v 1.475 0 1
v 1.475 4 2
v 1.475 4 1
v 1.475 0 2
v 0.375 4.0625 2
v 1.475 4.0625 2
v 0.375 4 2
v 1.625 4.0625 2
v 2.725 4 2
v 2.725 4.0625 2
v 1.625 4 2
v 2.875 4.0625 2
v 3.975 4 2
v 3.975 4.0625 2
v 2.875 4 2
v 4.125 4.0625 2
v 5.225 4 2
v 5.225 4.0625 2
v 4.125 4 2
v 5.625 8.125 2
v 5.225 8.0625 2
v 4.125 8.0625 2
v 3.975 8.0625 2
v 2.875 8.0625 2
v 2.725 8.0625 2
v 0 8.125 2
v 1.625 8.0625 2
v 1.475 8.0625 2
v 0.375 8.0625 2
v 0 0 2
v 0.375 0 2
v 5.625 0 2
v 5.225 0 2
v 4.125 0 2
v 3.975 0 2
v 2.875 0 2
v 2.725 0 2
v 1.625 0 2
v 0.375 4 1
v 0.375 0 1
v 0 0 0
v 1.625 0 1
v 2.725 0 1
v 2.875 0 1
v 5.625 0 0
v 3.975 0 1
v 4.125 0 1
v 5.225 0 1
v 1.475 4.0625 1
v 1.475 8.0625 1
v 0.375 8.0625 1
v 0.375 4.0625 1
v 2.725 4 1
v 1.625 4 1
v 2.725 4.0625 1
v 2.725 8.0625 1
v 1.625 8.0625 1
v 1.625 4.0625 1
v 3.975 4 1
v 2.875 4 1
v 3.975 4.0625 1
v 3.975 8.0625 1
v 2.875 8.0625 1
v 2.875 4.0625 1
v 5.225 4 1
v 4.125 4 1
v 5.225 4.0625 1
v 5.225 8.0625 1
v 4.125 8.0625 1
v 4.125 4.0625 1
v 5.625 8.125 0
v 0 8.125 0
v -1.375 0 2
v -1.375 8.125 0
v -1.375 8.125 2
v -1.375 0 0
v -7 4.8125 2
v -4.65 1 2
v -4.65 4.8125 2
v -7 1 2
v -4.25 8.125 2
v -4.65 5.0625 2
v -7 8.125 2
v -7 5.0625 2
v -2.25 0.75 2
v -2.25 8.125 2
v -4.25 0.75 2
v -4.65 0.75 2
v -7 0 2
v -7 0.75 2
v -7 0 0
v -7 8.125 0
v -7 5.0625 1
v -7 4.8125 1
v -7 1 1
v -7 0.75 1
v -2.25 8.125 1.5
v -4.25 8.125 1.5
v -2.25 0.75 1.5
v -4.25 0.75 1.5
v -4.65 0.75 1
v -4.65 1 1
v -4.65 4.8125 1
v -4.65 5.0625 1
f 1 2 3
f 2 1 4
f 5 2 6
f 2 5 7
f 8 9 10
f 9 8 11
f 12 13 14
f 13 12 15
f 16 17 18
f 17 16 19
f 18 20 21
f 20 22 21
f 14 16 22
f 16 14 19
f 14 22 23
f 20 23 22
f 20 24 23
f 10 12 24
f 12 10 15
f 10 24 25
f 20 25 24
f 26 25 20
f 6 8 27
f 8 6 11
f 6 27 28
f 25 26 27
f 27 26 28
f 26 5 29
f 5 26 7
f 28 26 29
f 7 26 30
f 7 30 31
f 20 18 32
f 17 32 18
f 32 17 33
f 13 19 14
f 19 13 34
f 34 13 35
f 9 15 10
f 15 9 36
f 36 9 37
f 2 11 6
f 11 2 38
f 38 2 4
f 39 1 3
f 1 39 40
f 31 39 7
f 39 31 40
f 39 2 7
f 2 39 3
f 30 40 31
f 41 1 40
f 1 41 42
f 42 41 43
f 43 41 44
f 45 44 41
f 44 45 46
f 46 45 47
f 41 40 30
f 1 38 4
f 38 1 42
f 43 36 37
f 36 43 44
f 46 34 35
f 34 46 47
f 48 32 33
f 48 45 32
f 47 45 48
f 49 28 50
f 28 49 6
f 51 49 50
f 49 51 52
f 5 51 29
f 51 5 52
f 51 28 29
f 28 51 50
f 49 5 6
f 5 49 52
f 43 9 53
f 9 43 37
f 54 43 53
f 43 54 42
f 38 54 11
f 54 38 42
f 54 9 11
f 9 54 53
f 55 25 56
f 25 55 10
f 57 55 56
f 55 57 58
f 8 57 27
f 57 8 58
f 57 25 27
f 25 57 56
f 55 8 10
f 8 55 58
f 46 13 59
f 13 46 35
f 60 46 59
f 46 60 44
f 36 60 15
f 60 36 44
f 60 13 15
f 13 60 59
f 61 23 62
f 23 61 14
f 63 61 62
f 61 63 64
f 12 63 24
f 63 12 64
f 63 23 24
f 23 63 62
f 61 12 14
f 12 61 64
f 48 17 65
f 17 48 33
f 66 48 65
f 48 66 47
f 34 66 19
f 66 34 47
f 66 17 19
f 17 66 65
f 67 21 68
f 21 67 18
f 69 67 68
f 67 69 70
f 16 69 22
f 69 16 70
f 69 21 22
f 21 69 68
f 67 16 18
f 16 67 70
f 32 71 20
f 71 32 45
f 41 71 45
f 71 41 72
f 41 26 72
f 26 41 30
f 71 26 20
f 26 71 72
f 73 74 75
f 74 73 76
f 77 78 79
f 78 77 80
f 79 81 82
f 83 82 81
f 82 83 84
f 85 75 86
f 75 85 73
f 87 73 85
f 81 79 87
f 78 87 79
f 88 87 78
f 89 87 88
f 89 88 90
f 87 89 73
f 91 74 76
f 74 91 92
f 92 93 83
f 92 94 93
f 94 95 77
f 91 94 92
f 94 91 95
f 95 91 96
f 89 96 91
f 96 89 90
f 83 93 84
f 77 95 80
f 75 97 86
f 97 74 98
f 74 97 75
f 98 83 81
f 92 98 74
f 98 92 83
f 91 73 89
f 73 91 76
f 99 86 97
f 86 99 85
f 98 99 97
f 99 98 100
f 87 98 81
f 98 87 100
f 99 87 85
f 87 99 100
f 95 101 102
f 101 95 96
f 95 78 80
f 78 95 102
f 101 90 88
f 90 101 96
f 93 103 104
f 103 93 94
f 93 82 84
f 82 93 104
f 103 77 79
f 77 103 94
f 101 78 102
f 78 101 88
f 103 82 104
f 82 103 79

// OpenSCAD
Top();
translate([-7,0,0]) Bottom();

Width=5+5/8;
Length=8.125;
Height=2;

//Number of Drives
DriveNumX=2;
DriveNumY=4;

//drive offset
DriveOffsetX1=3/8;
DriveOffsetX2=1.25;
DriveOffsetY=0;
DriveOffsetZ=1;

//drive spacing
DriveSpace=0.125/2;
DriveInset=1;
DriveBaseOffset=0;

//drive demintions
DriveLength=5.75;
DriveWidth=1.1;
DriveHeight=4;

//supports
SupportOffset=0.4;
SupportRadius=0;

//bottom cutouts
cablegrooveX=0;
connectorCutX=2;
connectorCutY=0.25;
connectorCutZ=1;
connectorOffX1=DriveOffsetX1+DriveWidth-connectorCutX;
connectorOffX2=DriveOffsetX2+DriveWidth-connectorCutX;

module Top()
{
difference()
	{
	cube([Width,Length,Height]);

for (J = [0 : DriveNumY-1])
{
	for (Z = [0 : DriveNumX-1])
	{
		translate([DriveOffsetX1+DriveOffsetX2*J,DriveBaseOffset+DriveSpace*Z+DriveHeight*Z,DriveOffsetZ]) cube([DriveWidth,DriveHeight,DriveInset]);
	}
}

	translate([SupportOffset,SupportOffset,1]) cylinder (h=1,r=SupportRadius);
	translate([Width-SupportOffset,SupportOffset,1]) cylinder (h=1,r=SupportRadius);
	translate([SupportOffset,Length-SupportOffset,1]) cylinder (h=1,r=SupportRadius);
	translate([Width-SupportOffset,Length-SupportOffset,1]) cylinder (h=1,r=SupportRadius);

	translate([SupportOffset,Length/2,1]) cylinder (h=1,r=SupportRadius);
	translate([Width/2,SupportOffset,1]) cylinder (h=1,r=SupportRadius);
	translate([Width/2,Length-SupportOffset,1]) cylinder (h=1,r=SupportRadius);
	translate([Width-SupportOffset,Length/2,1]) cylinder (h=1,r=SupportRadius);

	translate([Width/2,Length/2,1]) cylinder (h=1,r=SupportRadius);
	}
}

module Bottom()
{
difference()
	{
	cube([Width,Length,Height]);
	translate([2.75,.75,1.5]) cube([connectorCutX,11.25,0.5]);
	translate([7.25,.75,1.5]) cube([connectorCutX,11.25,0.5]);

	translate([connectorOffX1,0.75+DriveSpace*0+DriveHeight*0,DriveOffsetZ]) cube([connectorCutX,connectorCutY,connectorCutZ]);
	translate([connectorOffX1,0.75+DriveSpace*1+DriveHeight*1,DriveOffsetZ]) cube([connectorCutX,connectorCutY,connectorCutZ]);
	translate([connectorOffX1,0.75+DriveSpace*2+DriveHeight*2,DriveOffsetZ]) cube([connectorCutX,connectorCutY,connectorCutZ]);
	translate([connectorOffX1,0.75+DriveSpace*3+DriveHeight*3,DriveOffsetZ]) cube([connectorCutX,connectorCutY,connectorCutZ]);
	translate([connectorOffX1,0.75+DriveSpace*4+DriveHeight*4,DriveOffsetZ]) cube([connectorCutX,connectorCutY,connectorCutZ]);
	translate([connectorOffX1,0.75+DriveSpace*5+DriveHeight*5,DriveOffsetZ]) cube([connectorCutX,connectorCutY,connectorCutZ]);

	translate([connectorOffX2,0.75+DriveSpace*0+DriveHeight*0,DriveOffsetZ]) cube([connectorCutX,connectorCutY,connectorCutZ]);
	translate([connectorOffX2,0.75+DriveSpace*1+DriveHeight*1,DriveOffsetZ]) cube([connectorCutX,connectorCutY,connectorCutZ]);
	translate([connectorOffX2,0.75+DriveSpace*2+DriveHeight*2,DriveOffsetZ]) cube([connectorCutX,connectorCutY,connectorCutZ]);
	translate([connectorOffX2,0.75+DriveSpace*3+DriveHeight*3,DriveOffsetZ]) cube([connectorCutX,connectorCutY,connectorCutZ]);
	translate([connectorOffX2,0.75+DriveSpace*4+DriveHeight*4,DriveOffsetZ]) cube([connectorCutX,connectorCutY,connectorCutZ]);
	translate([connectorOffX2,0.75+DriveSpace*5+DriveHeight*5,DriveOffsetZ]) cube([connectorCutX,connectorCutY,connectorCutZ]);

	translate([SupportOffset,SupportOffset,1]) cylinder (h=1,r=SupportRadius);
	translate([Width-SupportOffset,SupportOffset,1]) cylinder (h=1,r=SupportRadius);
	translate([SupportOffset,Length-SupportOffset,1]) cylinder (h=1,r=SupportRadius);
	translate([Width-SupportOffset,Length-SupportOffset,1]) cylinder (h=1,r=SupportRadius);

	translate([SupportOffset,Length/2,1]) cylinder (h=1,r=SupportRadius);
	translate([Width/2,SupportOffset,1]) cylinder (h=1,r=SupportRadius);
	translate([Width/2,Length-SupportOffset,1]) cylinder (h=1,r=SupportRadius);
	translate([Width-SupportOffset,Length/2,1]) cylinder (h=1,r=SupportRadius);

	translate([Width/2,Length/2,1]) cylinder (h=1,r=SupportRadius);
	}
}
